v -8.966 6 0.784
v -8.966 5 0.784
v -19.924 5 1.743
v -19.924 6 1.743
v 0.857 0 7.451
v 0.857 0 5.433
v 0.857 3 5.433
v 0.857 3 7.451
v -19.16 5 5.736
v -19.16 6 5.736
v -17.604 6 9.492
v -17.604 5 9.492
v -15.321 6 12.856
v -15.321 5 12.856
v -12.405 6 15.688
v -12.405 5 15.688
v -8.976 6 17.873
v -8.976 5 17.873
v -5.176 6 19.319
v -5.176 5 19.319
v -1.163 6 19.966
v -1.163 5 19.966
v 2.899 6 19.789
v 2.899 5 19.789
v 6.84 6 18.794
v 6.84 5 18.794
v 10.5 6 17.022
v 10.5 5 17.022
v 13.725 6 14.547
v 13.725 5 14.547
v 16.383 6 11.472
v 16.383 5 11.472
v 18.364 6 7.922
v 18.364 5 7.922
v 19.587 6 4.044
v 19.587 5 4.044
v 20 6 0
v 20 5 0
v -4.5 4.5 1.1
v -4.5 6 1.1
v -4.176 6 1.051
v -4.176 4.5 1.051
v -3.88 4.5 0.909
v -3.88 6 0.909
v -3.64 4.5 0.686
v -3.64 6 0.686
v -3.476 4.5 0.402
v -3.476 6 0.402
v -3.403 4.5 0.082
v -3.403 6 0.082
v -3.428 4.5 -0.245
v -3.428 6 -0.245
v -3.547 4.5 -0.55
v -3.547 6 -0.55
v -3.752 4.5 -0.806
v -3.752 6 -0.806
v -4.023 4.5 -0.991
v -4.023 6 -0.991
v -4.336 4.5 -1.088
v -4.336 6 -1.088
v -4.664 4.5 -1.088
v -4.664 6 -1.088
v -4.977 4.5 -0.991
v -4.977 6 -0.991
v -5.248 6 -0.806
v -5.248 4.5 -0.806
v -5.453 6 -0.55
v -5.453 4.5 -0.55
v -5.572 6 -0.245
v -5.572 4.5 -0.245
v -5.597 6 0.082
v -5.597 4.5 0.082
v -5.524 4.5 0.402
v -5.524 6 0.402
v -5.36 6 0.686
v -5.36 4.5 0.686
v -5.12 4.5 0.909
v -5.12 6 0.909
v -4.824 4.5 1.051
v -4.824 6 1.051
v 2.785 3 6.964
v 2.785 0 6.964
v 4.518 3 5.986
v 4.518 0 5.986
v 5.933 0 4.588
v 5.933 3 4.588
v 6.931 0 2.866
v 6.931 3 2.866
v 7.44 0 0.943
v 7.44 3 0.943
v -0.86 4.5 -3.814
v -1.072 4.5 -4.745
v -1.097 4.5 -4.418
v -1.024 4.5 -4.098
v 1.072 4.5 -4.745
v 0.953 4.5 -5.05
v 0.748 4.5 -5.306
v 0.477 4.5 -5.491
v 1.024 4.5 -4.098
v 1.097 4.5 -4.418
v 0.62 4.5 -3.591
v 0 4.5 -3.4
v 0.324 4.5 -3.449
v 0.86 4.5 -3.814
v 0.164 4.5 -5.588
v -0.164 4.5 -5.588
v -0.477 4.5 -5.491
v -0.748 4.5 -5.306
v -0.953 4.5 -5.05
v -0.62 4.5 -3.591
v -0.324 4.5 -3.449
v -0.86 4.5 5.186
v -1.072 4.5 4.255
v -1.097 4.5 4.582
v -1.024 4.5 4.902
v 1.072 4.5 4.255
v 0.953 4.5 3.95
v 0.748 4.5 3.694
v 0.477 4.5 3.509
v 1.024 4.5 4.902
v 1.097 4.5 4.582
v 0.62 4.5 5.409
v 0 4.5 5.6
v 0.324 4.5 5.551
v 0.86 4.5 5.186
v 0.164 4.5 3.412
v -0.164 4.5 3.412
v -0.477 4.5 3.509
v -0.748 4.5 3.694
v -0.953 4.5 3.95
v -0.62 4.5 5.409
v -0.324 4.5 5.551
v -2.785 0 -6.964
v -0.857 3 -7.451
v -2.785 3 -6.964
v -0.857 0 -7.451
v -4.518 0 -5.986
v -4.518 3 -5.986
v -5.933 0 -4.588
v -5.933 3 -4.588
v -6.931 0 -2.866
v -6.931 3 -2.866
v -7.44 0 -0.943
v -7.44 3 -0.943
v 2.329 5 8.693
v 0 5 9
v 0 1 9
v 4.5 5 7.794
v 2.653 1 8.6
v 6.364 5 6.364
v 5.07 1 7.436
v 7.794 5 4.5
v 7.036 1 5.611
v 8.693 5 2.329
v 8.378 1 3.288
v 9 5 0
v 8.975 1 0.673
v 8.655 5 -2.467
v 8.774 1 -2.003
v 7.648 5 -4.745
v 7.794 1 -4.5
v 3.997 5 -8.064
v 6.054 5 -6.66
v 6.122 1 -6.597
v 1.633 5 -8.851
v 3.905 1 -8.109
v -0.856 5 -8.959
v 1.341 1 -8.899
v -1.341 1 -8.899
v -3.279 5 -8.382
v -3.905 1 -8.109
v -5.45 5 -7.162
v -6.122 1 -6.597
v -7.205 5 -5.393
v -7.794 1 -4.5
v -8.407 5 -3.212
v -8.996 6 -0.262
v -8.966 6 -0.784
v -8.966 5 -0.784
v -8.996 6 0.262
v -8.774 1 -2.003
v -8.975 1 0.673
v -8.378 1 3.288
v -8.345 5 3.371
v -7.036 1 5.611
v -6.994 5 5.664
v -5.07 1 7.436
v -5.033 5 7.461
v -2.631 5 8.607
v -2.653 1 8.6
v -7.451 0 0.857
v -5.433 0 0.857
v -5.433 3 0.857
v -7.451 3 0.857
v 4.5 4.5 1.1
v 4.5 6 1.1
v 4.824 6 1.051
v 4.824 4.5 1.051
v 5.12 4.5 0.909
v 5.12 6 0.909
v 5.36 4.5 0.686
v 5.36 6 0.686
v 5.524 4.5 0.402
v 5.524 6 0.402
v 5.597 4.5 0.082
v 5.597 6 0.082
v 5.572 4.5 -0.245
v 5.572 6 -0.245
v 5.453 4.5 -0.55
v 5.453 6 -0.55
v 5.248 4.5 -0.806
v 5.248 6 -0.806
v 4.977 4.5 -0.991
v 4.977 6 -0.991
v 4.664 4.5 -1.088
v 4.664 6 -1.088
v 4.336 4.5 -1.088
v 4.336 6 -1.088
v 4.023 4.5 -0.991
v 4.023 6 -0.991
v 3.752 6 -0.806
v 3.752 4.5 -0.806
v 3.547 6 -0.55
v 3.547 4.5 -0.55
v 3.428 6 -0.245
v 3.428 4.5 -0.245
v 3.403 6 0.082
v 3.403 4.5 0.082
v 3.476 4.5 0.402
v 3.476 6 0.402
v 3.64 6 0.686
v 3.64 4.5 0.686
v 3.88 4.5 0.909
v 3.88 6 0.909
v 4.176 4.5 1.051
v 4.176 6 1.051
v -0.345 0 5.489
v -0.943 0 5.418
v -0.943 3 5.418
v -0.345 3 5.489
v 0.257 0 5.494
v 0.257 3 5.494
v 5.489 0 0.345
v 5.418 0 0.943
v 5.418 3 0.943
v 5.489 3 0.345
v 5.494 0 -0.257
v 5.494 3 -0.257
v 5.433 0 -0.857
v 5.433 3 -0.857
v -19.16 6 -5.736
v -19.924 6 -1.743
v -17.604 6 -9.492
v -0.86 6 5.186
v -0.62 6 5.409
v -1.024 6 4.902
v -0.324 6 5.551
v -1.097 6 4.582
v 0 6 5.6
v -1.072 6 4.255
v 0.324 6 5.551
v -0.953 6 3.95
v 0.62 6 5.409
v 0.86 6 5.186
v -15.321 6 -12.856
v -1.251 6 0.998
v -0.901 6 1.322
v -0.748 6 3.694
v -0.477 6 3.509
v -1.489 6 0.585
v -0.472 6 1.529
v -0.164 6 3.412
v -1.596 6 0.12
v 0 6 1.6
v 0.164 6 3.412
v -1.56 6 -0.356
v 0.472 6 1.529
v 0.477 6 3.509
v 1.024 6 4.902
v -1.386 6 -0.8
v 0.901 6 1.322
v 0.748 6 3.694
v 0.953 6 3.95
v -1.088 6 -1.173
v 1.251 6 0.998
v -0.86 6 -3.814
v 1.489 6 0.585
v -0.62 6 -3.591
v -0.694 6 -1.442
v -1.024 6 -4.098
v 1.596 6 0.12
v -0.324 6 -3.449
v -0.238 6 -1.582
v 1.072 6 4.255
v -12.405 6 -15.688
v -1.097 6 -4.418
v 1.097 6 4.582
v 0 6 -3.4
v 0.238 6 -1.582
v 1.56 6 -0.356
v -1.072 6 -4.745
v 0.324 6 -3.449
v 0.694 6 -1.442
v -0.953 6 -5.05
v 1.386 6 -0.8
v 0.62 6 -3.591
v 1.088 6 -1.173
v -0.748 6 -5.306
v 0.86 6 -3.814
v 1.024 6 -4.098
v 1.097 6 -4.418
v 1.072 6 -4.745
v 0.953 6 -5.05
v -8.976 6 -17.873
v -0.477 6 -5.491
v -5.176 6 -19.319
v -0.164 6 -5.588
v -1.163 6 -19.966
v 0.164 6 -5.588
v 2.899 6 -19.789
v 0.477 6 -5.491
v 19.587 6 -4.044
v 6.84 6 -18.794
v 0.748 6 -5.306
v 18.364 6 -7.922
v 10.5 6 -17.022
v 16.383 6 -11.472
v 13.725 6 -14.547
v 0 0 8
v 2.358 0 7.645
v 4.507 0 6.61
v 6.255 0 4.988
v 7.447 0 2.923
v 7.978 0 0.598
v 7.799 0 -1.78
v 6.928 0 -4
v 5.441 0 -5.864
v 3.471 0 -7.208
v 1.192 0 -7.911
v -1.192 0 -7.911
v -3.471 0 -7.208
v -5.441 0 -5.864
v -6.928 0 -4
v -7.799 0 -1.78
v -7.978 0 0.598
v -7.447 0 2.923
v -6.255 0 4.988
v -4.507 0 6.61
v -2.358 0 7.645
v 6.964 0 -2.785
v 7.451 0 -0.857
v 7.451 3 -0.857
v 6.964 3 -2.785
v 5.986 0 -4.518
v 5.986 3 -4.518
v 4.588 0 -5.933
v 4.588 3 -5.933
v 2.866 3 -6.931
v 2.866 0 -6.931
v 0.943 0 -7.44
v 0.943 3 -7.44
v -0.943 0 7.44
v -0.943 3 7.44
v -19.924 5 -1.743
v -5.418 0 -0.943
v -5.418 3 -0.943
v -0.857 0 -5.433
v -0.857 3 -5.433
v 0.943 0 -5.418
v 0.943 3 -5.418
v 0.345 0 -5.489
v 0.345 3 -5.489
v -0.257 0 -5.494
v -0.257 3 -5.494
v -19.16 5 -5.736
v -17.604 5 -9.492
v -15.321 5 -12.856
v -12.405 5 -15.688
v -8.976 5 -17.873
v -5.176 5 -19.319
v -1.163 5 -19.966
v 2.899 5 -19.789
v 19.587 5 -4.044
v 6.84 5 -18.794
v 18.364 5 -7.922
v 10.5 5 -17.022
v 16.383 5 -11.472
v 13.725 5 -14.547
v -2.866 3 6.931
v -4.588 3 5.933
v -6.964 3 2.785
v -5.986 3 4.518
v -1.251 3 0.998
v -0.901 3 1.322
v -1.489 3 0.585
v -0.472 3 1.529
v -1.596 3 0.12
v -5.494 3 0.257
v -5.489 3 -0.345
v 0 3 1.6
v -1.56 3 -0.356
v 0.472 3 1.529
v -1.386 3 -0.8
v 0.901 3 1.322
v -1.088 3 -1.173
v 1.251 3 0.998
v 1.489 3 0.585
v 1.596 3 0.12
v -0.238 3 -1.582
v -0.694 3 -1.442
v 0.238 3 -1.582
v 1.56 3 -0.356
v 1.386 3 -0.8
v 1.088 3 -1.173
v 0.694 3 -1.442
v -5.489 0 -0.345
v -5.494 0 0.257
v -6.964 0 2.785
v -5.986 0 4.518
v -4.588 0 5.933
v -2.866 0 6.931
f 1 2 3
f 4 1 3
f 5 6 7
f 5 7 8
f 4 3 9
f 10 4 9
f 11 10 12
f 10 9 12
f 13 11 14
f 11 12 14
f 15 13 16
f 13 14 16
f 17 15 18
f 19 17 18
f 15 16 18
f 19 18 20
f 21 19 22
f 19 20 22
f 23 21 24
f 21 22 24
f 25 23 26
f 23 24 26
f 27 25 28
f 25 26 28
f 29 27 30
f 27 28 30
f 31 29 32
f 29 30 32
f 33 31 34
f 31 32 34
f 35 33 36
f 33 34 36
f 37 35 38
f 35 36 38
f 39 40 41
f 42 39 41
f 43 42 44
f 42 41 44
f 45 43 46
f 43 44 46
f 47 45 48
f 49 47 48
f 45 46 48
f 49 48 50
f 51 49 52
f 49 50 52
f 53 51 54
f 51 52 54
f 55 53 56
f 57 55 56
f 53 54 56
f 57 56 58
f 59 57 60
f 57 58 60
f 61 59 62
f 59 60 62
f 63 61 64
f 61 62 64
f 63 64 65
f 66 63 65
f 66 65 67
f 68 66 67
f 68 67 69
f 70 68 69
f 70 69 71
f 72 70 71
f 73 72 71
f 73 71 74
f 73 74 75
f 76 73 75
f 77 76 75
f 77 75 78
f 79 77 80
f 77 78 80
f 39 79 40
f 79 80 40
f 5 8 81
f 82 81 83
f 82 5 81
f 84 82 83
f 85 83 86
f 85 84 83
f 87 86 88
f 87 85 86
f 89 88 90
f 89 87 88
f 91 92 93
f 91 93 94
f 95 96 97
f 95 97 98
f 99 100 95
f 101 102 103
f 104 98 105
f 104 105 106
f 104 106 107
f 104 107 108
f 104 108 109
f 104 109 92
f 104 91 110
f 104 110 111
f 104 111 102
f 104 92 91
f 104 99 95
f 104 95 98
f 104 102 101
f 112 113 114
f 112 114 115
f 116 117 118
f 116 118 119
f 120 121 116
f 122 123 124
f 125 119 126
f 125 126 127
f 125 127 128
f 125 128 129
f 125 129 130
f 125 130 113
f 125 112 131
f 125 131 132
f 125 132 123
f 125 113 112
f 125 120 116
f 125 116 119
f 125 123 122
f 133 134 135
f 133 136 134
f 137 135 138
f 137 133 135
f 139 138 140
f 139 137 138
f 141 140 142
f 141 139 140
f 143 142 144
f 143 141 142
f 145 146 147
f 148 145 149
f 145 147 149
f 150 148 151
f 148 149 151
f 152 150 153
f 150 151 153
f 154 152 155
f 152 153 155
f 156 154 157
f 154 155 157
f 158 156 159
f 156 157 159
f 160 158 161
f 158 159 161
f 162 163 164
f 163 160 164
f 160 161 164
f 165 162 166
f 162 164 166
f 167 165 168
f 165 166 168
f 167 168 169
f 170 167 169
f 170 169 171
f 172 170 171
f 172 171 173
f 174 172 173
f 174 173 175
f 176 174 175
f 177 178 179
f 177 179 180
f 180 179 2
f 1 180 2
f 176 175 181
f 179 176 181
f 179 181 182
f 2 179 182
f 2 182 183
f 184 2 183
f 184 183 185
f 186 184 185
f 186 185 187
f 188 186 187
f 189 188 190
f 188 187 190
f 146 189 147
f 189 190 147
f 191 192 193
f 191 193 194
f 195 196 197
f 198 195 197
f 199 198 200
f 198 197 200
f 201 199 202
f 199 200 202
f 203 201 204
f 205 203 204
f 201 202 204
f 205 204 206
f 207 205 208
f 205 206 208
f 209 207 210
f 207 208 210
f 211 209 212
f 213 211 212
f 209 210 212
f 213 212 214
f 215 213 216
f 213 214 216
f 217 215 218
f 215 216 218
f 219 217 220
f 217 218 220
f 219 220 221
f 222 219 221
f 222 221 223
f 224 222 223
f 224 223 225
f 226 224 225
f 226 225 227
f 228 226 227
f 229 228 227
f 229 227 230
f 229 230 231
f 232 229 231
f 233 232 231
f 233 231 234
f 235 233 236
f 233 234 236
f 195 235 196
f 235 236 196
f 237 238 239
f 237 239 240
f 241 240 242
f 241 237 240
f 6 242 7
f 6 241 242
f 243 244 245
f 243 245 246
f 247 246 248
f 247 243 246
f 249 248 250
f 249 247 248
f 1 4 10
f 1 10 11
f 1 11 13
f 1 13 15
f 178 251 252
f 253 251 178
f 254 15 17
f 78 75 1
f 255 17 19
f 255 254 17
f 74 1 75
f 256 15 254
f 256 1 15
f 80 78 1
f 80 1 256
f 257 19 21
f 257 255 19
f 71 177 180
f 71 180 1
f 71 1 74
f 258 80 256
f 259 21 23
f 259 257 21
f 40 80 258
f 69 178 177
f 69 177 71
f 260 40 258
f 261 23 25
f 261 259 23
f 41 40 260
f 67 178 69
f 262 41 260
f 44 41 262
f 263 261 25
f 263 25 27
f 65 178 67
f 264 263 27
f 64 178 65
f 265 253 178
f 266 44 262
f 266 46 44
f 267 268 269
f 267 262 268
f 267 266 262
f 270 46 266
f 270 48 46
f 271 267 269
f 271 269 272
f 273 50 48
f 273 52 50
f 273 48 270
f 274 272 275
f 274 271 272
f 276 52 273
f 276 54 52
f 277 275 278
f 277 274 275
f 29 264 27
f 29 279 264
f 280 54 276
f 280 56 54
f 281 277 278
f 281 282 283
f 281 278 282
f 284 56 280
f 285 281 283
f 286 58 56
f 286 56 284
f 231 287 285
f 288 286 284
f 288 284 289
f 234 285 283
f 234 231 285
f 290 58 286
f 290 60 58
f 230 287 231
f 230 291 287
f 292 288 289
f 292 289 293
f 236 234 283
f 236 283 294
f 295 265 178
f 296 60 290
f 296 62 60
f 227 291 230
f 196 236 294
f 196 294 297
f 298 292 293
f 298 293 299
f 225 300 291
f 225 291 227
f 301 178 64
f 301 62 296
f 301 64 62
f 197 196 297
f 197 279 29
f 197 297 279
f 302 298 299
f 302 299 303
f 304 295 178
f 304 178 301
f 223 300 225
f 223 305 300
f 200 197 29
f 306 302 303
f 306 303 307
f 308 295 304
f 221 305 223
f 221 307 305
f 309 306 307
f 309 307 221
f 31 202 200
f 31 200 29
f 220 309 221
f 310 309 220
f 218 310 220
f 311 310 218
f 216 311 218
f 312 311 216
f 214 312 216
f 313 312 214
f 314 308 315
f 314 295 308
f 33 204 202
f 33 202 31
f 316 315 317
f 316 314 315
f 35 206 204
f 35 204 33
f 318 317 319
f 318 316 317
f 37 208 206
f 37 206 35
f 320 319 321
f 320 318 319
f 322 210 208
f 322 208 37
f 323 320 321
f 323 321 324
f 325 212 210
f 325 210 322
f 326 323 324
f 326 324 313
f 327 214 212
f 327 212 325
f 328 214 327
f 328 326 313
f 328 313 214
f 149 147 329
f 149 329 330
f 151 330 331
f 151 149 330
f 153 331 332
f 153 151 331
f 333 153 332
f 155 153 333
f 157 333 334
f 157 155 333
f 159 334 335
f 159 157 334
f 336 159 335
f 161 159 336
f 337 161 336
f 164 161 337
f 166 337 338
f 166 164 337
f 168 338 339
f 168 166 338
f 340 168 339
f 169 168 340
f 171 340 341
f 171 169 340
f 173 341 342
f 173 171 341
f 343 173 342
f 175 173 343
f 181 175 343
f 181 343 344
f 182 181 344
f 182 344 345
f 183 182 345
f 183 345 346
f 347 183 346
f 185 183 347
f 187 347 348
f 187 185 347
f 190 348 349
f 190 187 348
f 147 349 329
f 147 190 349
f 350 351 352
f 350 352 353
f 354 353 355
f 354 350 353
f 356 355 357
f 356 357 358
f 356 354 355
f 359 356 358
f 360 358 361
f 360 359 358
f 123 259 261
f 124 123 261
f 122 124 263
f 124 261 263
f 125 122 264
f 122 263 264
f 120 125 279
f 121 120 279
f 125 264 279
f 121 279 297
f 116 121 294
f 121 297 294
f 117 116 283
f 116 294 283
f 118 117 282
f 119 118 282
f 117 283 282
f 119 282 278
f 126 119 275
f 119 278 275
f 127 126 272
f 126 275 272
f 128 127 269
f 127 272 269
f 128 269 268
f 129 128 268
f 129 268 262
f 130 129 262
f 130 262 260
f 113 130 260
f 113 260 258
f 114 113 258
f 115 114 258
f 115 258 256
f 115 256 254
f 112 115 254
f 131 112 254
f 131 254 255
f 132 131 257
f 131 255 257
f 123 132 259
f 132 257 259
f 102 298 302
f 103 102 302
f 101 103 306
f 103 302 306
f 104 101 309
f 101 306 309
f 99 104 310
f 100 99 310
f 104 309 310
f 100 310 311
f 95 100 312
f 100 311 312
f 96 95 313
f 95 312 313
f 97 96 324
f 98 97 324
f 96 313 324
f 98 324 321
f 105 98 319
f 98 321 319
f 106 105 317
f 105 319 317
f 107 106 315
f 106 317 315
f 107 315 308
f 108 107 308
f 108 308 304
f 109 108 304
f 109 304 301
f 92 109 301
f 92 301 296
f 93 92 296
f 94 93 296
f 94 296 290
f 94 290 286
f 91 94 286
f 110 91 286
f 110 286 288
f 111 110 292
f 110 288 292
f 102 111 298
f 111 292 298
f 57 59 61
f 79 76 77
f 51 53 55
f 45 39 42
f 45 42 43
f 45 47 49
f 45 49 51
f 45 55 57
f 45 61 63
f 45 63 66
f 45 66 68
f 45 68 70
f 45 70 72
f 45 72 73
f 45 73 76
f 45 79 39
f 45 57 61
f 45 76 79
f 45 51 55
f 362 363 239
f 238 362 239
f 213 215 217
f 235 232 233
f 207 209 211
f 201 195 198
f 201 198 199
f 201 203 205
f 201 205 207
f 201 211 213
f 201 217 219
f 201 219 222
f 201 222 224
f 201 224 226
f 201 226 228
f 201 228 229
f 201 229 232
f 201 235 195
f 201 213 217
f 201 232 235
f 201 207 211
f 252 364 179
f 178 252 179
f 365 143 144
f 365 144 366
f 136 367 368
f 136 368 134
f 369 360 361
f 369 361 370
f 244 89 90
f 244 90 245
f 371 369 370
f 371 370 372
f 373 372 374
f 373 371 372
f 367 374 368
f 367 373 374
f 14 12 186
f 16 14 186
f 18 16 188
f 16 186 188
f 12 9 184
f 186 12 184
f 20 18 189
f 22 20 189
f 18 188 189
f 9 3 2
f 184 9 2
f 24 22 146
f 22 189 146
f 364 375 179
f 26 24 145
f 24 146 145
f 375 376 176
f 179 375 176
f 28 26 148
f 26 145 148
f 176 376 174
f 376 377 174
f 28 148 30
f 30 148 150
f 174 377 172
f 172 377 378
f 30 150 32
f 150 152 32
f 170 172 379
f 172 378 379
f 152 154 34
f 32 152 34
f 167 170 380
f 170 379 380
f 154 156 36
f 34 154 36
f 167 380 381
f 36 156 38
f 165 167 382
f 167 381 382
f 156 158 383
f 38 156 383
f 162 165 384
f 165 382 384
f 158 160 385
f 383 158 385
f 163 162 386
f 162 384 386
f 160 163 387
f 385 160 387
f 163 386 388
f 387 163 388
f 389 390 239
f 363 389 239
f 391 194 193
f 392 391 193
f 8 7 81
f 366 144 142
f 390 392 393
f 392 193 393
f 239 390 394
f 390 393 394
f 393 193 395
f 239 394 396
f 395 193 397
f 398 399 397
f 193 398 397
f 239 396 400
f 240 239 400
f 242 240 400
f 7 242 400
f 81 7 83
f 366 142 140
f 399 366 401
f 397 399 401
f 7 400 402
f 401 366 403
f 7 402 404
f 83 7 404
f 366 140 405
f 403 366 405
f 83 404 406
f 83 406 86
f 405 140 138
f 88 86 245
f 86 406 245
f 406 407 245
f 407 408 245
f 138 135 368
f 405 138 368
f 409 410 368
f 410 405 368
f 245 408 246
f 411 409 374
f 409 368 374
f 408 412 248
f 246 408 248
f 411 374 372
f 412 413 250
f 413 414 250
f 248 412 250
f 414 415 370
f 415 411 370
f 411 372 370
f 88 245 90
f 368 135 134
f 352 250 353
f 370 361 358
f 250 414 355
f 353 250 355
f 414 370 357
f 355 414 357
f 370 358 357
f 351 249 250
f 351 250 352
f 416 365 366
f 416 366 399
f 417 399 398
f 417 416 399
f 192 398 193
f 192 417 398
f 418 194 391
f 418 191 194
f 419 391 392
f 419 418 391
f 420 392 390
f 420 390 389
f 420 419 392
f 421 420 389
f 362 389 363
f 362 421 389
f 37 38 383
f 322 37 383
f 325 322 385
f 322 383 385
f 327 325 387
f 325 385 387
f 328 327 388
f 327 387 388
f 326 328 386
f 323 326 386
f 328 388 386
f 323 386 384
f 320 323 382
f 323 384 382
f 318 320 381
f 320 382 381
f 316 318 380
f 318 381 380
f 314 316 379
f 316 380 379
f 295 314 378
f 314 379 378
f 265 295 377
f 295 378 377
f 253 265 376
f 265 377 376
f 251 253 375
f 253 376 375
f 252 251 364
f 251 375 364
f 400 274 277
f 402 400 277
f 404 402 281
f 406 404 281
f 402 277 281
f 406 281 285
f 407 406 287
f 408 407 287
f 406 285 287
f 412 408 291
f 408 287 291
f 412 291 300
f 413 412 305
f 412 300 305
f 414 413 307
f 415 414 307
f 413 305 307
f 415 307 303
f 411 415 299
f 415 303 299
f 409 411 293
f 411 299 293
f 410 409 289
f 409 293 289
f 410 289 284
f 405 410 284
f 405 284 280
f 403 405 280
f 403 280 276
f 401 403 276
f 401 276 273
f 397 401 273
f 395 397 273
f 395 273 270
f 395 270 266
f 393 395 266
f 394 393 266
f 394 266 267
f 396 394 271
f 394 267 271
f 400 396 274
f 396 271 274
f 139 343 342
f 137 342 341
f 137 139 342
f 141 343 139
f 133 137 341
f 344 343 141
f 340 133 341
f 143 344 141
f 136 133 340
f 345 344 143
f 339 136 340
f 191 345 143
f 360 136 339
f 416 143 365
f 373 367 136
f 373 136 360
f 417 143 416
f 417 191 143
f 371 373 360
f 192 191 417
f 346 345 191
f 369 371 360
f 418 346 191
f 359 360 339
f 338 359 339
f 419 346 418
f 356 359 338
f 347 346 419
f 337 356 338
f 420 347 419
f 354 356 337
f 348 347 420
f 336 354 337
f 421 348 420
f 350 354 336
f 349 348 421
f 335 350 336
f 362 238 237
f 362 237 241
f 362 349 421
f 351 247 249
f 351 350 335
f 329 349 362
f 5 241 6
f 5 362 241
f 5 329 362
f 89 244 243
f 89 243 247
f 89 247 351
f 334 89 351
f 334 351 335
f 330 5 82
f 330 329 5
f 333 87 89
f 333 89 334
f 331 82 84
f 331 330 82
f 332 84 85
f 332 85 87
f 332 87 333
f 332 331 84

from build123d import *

# Parameters (mm, degrees)
SKETCH_1_R          = 9
SKETCH_1_R_2        = 7.5
EXTRUDE_1_DEPTH     = 6
EXTRUDE_START       = -1
EXTRUDE_2_DEPTH     = 1
EXTRUDE_3_DEPTH     = 3
EXTRUDE_START_2     = -3
SKETCH_5_R          = 7.5
EXTRUDE_4_DEPTH     = 3
SKETCH_6_R          = 1.6
CUT_EXTRUDE_1_DEPTH = 3
CHAMFER_1_SIZE      = 1
SKETCH_14_R         = 1.1
CUT_EXTRUDE_4_DEPTH = 1.5


with BuildPart() as part:
    # 草图1 → 凸台-拉伸1 (new body)
    with BuildSketch(Plane(origin=(0, 0, 0), x_dir=(1, 0, 0), z_dir=(0, 1, 0))):
        with Locations(Location((0, 0, 0), (0, 0, 270))):
            Circle(SKETCH_1_R)
        with Locations(Location((0, 0, 0), (0, 0, 270))):
            Circle(SKETCH_1_R_2, mode=Mode.SUBTRACT)
    extrude(amount=EXTRUDE_1_DEPTH)

    # 草图2 → 凸台-拉伸2 (add)
    with BuildSketch(Plane(origin=(0, 6, 0), x_dir=(1, 0, 0), z_dir=(0, 1, 0)).offset(EXTRUDE_START)):
        with BuildLine():
            Line((-19.923893962, 1.743114855), (-8.965752283, 0.784401685))
            ThreePointArc((-8.965752283, 0.784401685), (0.392574486, 8.991433994), (9, 0))
            ThreePointArc((9, 0), (0.392574486, -8.991433994), (-8.965752283, -0.784401685))
            Line((-8.965752283, -0.784401685), (-19.923893962, -1.743114855))
            ThreePointArc((-19.923893962, -1.743114855), (0.872387747, -19.980964432), (20, 0))
            ThreePointArc((20, 0), (0.872387747, 19.980964432), (-19.923893962, 1.743114855))
        make_face()
    extrude(amount=EXTRUDE_2_DEPTH)

    # 草图4 → 凸台-拉伸3 (add)
    with BuildSketch(Plane.XZ):
        with BuildLine():
            Line((0.856553191, 6.326082651), (0.856553191, 7.450927233))
            ThreePointArc((0.856553191, 7.450927233), (-0.043739259, 7.499872457), (-0.943399591, 7.440429908))
            Line((-0.943399591, 7.440429908), (-0.943399591, 6.312339741))
            Line((-0.943399591, 6.312339741), (-0.943399591, 5.418486616))
            ThreePointArc((-0.943399591, 5.418486616), (-0.044016518, 5.499823865), (0.856553191, 5.432892106))
            Line((0.856553191, 5.432892106), (0.856553191, 6.326082651))
        make_face()
        with BuildLine():
            Line((6.312339741, 0.943399591), (5.418486616, 0.943399591))
            ThreePointArc((5.418486616, 0.943399591), (5.499823865, 0.044016518), (5.432892106, -0.856553191))
            Line((5.432892106, -0.856553191), (6.326082651, -0.856553191))
            Line((6.326082651, -0.856553191), (7.450927233, -0.856553191))
            ThreePointArc((7.450927233, -0.856553191), (7.499872457, 0.043739259), (7.440429908, 0.943399591))
            Line((7.440429908, 0.943399591), (6.312339741, 0.943399591))
        make_face()
        with BuildLine():
            Line((0.943399591, -6.312339741), (0.943399591, -5.418486616))
            ThreePointArc((0.943399591, -5.418486616), (0.044016518, -5.499823865), (-0.856553191, -5.432892106))
            Line((-0.856553191, -5.432892106), (-0.856553191, -6.326082651))
            Line((-0.856553191, -6.326082651), (-0.856553191, -7.450927233))
            ThreePointArc((-0.856553191, -7.450927233), (0.043739259, -7.499872457), (0.943399591, -7.440429908))
            Line((0.943399591, -7.440429908), (0.943399591, -6.312339741))
        make_face()
        with BuildLine():
            Line((-6.312339741, -0.943399591), (-5.418486616, -0.943399591))
            ThreePointArc((-5.418486616, -0.943399591), (-5.499823865, -0.044016518), (-5.432892106, 0.856553191))
            Line((-5.432892106, 0.856553191), (-6.326082651, 0.856553191))
            Line((-6.326082651, 0.856553191), (-7.450927233, 0.856553191))
            ThreePointArc((-7.450927233, 0.856553191), (-7.499872457, -0.043739259), (-7.440429908, -0.943399591))
            Line((-7.440429908, -0.943399591), (-6.312339741, -0.943399591))
        make_face()
    extrude(amount=-EXTRUDE_3_DEPTH)

    # 草图5 → 凸台-拉伸4 (add)
    with BuildSketch(Plane(origin=(0, 6, 0), x_dir=(1, 0, 0), z_dir=(0, 1, 0)).offset(EXTRUDE_START_2)):
        Circle(SKETCH_5_R)
    extrude(amount=EXTRUDE_4_DEPTH)

    # 草图6 → 切除-拉伸1 (cut)
    with BuildSketch(Plane(origin=(0, 6, 0), x_dir=(1, 0, 0), z_dir=(0, 1, 0))):
        with Locations(Location((0, 0, 0), (0, 0, 270))):
            Circle(SKETCH_6_R)
    extrude(amount=-CUT_EXTRUDE_1_DEPTH, mode=Mode.SUBTRACT)

    # 倒角1
    chamfer_1_edges = [part.edges().sort_by_distance(p)[0] for p in [
        (0, 0, -9),
    ]]
    chamfer(chamfer_1_edges, length=CHAMFER_1_SIZE)

    # 草图14 → 切除-拉伸4 (cut)
    with BuildSketch(Plane(origin=(0, 6, 0), x_dir=(1, 0, 0), z_dir=(0, 1, 0))):
        with Locations(Location((0, 4.5, 0), (0, 0, 270))):
            Circle(SKETCH_14_R)
        with Locations(Location((4.5, 0, 0), (0, 0, 270))):
            Circle(SKETCH_14_R)
        with Locations(Location((0, -4.5, 0), (0, 0, 270))):
            Circle(SKETCH_14_R)
        with Locations(Location((-4.5, 0, 0), (0, 0, 270))):
            Circle(SKETCH_14_R)
    extrude(amount=-CUT_EXTRUDE_4_DEPTH, mode=Mode.SUBTRACT)


solid = part.part
